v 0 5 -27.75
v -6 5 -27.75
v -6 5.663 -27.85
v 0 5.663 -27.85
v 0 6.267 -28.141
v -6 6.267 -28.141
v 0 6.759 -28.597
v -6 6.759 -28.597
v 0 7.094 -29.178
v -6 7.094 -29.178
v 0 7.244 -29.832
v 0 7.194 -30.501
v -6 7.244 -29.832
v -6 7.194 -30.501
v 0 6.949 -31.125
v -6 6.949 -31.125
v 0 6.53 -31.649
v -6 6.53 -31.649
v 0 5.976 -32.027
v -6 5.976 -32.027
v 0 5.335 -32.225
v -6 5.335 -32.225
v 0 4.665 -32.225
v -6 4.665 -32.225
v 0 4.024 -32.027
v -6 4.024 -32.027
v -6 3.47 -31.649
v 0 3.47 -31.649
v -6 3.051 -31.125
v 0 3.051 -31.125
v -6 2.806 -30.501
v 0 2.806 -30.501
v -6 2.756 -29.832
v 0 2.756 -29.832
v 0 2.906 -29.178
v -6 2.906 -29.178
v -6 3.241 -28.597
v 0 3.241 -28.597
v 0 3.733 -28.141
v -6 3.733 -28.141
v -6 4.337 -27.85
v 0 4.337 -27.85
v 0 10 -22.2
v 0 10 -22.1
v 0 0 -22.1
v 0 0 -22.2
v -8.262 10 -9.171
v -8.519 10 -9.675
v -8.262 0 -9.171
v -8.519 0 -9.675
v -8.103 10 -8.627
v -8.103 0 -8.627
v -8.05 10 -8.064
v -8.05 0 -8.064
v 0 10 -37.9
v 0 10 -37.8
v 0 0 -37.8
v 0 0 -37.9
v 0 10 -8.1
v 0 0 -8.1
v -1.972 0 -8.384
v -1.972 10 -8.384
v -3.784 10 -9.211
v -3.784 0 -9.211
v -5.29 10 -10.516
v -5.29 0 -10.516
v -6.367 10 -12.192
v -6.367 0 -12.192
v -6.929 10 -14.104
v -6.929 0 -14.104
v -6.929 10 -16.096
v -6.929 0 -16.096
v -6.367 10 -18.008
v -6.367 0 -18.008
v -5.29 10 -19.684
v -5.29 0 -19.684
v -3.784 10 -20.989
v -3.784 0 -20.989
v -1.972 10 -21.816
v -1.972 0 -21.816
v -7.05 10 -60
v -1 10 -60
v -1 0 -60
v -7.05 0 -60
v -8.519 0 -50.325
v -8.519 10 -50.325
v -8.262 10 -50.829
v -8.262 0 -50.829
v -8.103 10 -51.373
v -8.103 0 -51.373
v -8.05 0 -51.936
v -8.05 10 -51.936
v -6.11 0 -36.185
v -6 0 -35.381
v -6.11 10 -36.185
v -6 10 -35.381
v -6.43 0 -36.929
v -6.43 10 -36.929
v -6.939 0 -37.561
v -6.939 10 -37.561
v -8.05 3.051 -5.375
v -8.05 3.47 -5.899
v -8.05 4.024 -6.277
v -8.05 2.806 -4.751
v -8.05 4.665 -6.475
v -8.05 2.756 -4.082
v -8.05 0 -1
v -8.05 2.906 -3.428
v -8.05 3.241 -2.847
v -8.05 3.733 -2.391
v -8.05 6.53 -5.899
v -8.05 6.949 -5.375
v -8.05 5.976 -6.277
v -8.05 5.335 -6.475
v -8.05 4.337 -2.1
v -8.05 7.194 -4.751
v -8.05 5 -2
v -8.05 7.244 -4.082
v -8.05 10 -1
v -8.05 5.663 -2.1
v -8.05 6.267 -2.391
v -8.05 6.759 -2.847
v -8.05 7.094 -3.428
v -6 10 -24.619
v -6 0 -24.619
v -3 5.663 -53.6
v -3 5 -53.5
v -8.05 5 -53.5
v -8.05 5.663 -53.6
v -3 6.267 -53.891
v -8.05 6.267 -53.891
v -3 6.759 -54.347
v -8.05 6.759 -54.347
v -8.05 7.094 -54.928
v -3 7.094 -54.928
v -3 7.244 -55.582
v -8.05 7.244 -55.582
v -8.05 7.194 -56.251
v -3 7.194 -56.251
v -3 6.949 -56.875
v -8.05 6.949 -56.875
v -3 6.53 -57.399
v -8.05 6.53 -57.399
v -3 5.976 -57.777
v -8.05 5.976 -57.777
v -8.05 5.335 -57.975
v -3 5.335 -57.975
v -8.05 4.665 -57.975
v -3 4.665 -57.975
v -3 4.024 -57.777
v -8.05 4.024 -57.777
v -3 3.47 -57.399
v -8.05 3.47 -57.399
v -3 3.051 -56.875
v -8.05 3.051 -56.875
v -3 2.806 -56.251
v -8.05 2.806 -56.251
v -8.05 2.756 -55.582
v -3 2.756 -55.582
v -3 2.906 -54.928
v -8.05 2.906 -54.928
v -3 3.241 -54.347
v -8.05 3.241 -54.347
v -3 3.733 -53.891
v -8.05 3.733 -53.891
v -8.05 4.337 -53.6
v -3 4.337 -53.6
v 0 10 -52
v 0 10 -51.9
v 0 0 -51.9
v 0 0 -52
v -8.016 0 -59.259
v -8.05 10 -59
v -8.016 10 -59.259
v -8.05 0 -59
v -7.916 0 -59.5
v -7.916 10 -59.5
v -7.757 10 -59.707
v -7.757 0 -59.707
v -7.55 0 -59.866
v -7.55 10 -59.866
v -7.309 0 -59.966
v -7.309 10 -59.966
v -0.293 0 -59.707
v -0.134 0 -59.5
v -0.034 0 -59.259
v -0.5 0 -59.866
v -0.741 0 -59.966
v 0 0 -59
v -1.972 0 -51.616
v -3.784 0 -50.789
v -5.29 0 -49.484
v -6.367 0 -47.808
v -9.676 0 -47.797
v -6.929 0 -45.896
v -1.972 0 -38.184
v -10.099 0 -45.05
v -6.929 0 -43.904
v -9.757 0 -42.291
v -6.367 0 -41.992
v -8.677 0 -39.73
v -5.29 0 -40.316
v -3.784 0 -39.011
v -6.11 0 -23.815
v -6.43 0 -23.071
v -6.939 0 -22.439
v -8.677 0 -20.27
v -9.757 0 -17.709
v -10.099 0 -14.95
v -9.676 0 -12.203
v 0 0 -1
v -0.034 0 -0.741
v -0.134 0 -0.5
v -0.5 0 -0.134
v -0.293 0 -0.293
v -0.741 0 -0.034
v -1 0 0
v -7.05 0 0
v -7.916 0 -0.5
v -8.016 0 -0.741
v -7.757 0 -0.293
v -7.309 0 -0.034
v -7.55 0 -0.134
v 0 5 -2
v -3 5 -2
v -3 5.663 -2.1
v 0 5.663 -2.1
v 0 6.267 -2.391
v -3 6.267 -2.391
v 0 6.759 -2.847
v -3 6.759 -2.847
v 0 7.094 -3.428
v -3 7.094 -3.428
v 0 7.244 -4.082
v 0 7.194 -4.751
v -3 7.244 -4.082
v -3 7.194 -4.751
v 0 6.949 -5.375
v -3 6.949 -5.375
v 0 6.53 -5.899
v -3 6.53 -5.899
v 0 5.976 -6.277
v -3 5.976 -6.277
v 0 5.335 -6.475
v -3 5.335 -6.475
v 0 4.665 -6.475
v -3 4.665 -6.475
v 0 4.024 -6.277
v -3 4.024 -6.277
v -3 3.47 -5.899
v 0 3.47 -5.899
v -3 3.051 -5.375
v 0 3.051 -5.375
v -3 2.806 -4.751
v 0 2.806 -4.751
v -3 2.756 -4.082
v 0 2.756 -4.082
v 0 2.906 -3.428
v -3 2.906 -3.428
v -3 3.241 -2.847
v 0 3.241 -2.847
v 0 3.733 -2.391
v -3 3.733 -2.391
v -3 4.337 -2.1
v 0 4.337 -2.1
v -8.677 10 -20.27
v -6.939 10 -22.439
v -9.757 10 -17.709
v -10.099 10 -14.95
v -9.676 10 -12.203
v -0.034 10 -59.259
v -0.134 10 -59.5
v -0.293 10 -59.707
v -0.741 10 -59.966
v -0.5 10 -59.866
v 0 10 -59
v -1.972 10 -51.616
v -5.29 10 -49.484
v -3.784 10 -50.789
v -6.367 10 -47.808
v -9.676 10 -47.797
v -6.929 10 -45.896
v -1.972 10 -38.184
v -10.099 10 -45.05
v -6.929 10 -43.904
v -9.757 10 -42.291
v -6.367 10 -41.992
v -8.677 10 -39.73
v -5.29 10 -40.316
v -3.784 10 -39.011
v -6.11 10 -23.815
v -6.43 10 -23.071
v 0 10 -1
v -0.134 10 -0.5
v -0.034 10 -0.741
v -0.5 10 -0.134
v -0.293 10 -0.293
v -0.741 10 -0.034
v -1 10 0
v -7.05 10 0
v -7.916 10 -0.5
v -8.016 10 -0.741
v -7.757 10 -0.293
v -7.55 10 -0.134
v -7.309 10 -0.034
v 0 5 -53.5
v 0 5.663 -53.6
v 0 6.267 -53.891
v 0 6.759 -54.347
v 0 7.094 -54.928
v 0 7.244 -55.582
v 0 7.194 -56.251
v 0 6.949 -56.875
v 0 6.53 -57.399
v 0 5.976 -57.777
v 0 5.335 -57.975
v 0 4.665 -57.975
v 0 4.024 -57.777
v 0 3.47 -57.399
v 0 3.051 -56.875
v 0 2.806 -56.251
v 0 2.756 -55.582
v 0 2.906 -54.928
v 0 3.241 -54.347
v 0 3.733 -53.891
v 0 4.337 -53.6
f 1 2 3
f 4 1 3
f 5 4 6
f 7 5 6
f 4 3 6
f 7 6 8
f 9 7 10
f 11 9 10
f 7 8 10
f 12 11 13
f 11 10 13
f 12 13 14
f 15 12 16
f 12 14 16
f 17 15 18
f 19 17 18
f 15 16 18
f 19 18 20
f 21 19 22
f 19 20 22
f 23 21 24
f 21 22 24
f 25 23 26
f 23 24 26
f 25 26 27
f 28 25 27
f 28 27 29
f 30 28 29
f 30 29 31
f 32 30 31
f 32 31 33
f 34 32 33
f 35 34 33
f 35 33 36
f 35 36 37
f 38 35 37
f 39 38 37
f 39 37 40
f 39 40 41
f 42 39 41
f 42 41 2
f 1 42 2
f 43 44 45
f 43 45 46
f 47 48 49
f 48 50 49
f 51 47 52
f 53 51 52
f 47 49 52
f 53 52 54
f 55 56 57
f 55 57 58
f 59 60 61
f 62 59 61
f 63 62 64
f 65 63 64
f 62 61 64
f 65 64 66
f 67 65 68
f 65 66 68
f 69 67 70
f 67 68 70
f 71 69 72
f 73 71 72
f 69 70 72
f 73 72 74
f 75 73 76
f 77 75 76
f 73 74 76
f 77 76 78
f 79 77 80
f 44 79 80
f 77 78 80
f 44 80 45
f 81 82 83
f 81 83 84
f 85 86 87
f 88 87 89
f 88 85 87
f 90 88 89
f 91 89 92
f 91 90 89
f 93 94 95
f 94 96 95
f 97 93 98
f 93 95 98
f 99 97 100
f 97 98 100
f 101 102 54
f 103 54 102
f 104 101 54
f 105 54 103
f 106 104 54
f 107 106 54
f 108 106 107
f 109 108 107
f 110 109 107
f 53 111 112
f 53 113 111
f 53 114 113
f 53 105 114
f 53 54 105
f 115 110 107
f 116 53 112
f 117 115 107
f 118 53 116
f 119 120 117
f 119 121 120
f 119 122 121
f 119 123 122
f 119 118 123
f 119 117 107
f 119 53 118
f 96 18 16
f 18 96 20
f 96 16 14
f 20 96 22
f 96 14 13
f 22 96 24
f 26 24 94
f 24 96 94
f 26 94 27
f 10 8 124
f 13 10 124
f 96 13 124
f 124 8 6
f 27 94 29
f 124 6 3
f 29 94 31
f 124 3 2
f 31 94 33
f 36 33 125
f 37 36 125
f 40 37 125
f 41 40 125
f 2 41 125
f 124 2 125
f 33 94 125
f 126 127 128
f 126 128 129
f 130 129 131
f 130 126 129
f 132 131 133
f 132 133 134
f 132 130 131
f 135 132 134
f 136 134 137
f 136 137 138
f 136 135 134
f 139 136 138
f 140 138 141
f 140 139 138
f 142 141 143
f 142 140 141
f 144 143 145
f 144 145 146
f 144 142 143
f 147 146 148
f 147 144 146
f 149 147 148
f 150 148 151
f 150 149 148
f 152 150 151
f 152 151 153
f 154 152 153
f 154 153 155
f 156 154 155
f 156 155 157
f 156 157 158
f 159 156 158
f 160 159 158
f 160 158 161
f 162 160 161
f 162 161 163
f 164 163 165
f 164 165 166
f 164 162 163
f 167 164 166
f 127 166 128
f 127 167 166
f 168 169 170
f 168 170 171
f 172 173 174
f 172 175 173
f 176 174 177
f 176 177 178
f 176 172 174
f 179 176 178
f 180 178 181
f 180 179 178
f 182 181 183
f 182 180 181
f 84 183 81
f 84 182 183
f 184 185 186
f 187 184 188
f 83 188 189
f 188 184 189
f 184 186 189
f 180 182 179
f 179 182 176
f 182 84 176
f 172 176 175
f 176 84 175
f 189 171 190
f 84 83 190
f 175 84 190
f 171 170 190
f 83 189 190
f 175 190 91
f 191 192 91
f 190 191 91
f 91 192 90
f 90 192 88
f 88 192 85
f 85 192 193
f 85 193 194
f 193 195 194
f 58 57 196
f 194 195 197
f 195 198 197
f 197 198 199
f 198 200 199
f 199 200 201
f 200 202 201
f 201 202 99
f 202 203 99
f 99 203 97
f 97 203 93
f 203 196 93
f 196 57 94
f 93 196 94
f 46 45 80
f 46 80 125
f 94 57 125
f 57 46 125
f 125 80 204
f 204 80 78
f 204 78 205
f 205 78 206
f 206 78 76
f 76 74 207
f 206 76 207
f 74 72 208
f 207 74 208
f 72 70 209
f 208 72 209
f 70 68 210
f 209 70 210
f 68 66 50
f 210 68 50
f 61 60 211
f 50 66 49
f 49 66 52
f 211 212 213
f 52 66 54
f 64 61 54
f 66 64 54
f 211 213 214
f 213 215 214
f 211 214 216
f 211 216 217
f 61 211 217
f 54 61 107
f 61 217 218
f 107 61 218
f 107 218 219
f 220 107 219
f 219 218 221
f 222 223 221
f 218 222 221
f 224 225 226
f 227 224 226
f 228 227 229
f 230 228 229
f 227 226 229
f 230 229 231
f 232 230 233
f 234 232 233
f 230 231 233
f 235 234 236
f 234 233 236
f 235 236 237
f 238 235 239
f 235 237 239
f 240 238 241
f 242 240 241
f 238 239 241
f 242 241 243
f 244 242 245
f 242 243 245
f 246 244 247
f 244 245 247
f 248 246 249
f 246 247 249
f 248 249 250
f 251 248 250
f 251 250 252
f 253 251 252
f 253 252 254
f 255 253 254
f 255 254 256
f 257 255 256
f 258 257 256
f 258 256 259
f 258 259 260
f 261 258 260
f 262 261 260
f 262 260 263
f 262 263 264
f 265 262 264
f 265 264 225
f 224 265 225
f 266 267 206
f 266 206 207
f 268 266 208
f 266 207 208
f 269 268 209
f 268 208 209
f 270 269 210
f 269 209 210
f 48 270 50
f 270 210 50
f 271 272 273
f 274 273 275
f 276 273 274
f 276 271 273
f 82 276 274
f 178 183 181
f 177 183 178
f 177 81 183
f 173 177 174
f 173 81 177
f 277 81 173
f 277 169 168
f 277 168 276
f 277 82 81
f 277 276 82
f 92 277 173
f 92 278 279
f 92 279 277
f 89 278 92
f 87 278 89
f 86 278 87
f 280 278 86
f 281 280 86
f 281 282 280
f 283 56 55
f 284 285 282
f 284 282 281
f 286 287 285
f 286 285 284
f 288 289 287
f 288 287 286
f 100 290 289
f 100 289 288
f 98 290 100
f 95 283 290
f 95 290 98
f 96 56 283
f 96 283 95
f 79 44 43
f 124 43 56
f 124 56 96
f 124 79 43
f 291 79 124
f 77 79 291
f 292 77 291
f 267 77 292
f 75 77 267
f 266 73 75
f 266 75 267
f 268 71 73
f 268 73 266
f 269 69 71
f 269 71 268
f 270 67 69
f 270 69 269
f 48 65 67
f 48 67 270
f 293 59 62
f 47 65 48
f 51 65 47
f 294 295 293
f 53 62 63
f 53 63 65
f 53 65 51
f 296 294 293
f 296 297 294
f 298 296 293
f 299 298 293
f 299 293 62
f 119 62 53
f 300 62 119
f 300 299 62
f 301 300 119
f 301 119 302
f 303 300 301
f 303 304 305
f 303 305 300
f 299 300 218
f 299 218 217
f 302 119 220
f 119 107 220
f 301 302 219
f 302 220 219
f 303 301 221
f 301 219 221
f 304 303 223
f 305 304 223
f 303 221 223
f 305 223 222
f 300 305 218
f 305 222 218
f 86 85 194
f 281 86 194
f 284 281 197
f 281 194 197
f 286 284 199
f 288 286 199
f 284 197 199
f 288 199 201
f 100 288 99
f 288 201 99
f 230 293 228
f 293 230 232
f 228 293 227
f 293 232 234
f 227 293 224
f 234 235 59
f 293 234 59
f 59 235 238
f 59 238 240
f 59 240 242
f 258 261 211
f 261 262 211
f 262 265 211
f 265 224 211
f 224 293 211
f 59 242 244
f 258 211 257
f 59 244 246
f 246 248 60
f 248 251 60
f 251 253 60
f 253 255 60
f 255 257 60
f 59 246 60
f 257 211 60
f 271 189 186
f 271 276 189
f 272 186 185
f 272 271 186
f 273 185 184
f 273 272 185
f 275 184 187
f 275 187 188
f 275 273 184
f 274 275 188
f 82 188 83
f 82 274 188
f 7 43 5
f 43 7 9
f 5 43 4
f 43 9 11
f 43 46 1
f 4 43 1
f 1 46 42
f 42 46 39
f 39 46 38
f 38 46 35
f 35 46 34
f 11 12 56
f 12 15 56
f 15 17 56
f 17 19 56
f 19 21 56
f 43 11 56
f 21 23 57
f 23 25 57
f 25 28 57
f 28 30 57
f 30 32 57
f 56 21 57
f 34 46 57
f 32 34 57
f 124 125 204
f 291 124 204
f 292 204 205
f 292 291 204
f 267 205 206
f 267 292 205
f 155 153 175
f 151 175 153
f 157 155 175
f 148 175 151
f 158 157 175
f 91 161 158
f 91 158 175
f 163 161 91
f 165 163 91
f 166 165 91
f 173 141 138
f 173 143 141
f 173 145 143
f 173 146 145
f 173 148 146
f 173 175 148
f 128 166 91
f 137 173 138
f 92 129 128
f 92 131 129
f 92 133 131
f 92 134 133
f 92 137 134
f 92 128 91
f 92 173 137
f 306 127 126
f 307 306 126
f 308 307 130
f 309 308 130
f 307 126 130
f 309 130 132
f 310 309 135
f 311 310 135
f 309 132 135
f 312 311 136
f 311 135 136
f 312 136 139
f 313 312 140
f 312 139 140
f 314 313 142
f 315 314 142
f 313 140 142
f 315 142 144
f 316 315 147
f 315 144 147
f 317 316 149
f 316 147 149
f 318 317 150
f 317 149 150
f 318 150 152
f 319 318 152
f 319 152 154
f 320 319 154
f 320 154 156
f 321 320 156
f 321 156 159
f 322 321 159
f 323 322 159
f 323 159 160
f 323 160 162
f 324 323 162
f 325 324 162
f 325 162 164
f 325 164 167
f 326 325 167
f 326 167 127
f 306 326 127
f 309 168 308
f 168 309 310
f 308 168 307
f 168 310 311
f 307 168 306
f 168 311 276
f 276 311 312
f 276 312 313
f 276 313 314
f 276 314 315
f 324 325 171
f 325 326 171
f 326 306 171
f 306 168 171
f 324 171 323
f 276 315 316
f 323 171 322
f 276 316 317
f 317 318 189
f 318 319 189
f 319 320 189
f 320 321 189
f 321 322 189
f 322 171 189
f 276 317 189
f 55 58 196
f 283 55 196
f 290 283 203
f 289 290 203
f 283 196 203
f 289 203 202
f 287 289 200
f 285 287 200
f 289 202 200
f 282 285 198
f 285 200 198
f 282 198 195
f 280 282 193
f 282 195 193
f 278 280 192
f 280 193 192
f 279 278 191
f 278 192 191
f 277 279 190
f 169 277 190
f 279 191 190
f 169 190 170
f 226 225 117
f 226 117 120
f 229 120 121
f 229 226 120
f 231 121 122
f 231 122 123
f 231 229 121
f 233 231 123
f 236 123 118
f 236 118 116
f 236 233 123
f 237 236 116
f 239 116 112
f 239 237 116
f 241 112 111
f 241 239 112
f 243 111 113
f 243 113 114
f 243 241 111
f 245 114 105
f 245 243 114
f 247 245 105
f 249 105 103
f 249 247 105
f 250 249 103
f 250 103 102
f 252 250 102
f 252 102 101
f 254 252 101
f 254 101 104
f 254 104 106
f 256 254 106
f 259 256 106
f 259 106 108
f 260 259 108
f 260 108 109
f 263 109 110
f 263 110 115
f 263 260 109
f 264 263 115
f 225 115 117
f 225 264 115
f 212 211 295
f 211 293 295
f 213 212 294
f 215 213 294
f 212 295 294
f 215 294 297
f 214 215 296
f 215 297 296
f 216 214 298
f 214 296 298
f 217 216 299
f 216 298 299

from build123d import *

# Parameters (mm, degrees)
EXTRUDE_1_DEPTH          = 10
EXTRUDE_2_DEPTH          = 10
SKETCH_3_R               = 2.25
CUT_EXTRUDE_1_DEPTH      = 5.049845
CUT_EXTRUDE_1_DEPTH_BACK = 4
EXTRUDE_4_DEPTH          = 10
SKETCH_4_R               = 2.25
CUT_EXTRUDE_2_DEPTH      = 7
FILLET_1_R               = 3
FILLET_2_R               = 1
EXTRUDE_3_DEPTH          = 10
FILLET_3_R               = 1


with BuildPart() as part:
    # Эскиз1 → Бобышка-Вытянуть1 (new body)
    with BuildSketch(Plane(origin=(0, 0, 0), x_dir=(1, 0, 0), z_dir=(0, 1, 0))):
        with BuildLine():
            Line((0, 0), (0, 8))
            ThreePointArc((0, 8), (-7.1, 15.1), (0, 22.2))
            Line((0, 22.2), (0, 37.8))
            ThreePointArc((0, 37.8), (-7.1, 44.9), (0, 52))
            Line((0, 52), (0, 60))
            Line((0, 60), (-3, 60))
            Line((-3, 60), (-3, 54.544169223))
            ThreePointArc((-3, 54.544169223), (-10.1, 44.9), (-3, 35.255830777))
            Line((-3, 35.255830777), (-3, 24.744169223))
            ThreePointArc((-3, 24.744169223), (-10.1, 15.1), (-3, 5.455830777))
            Line((-3, 5.455830777), (-3, 0))
            Line((-3, 0), (0, 0))
        make_face()
    extrude(amount=EXTRUDE_1_DEPTH)

    # Эскиз2 → Бобышка-Вытянуть2 (add)
    with BuildSketch(Plane(origin=(0, 10, 0), x_dir=(1, 0, 0), z_dir=(0, 1, 0))):
        with BuildLine():
            Line((-3, 60), (-8.049844719, 60))
            Line((-8.049844719, 60), (-8.049844719, 51))
            ThreePointArc((-8.049844719, 51), (-5.802159163, 53.167100402), (-3, 54.544169223))
            Line((-3, 54.544169223), (-3, 60))
        make_face()
        with BuildLine():
            Line((-3, 0), (-3, 5.455830777))
            ThreePointArc((-3, 5.455830777), (-5.802159163, 6.832899598), (-8.049844719, 9))
            Line((-8.049844719, 9), (-8.049844719, 0))
            Line((-8.049844719, 0), (-3, 0))
        make_face()
    extrude(amount=-EXTRUDE_2_DEPTH)

    # Эскиз3 → Вырез-Вытянуть1 (cut, two sides)
    with BuildSketch(Plane.ZY.offset(3)) as cut_extrude_1_sk:
        with Locations((-55.75, 5)):
            Circle(SKETCH_3_R)
        with Locations((-4.25, 5)):
            Circle(SKETCH_3_R)
    extrude(amount=CUT_EXTRUDE_1_DEPTH, mode=Mode.SUBTRACT)
    extrude(cut_extrude_1_sk.sketch, amount=-CUT_EXTRUDE_1_DEPTH_BACK, mode=Mode.SUBTRACT)

    # Эскиз7 → Бобышка-Вытянуть4 (add, through all)
    with BuildSketch(Plane(origin=(-3, 0, 0), x_dir=(0, 0, 1), z_dir=(0, 1, 0))):
        with BuildLine():
            Line((-36.775346161, -3), (-23.224653839, -3))
            ThreePointArc((-23.224653839, -3), (-24.11014807, -1.563686202), (-24.744169223, 0))
            Line((-24.744169223, 0), (-35.255830777, 0))
            ThreePointArc((-35.255830777, 0), (-35.88985193, -1.563686202), (-36.775346161, -3))
        make_face()
    extrude(amount=EXTRUDE_4_DEPTH)

    # Эскиз4 → Вырез-Вытянуть2 (cut, through all)
    with BuildSketch(Plane.ZY.offset(6)):
        with Locations((-30, 5)):
            Circle(SKETCH_4_R)
    extrude(amount=-CUT_EXTRUDE_2_DEPTH, mode=Mode.SUBTRACT)

    # Скругление1
    fillet_1_edges = [part.edges().sort_by_distance(p)[0] for p in [
        (-8.049844719, 5, -51),
        (-8.049844719, 5, -9),
        (-6, 5, -36.775346161),
        (-6, 5, -23.224653839),
    ]]
    fillet(fillet_1_edges, radius=FILLET_1_R)

    # Скругление2
    fillet_2_edges = [part.edges().sort_by_distance(p)[0] for p in [
        (-8.049844719, 5, -60),
        (-8.049844719, 5, 0),
    ]]
    fillet(fillet_2_edges, radius=FILLET_2_R)

    # Эскиз5 → Бобышка-Вытянуть3 (add, through all)
    with BuildSketch(Plane.XZ):
        with BuildLine():
            Line((0, -8), (0, -8.1))
            ThreePointArc((0, -8.1), (-7, -15.1), (0, -22.1))
            Line((0, -22.1), (0, -22.2))
            ThreePointArc((0, -22.2), (-7.1, -15.1), (0, -8))
        make_face()
        with BuildLine():
            Line((0, -51.9), (0, -52))
            ThreePointArc((0, -52), (-7.1, -44.9), (0, -37.8))
            Line((0, -37.8), (0, -37.9))
            ThreePointArc((0, -37.9), (-7, -44.9), (0, -51.9))
        make_face()
    extrude(amount=-EXTRUDE_3_DEPTH)

    # Скругление3
    fillet_3_edges = [part.edges().sort_by_distance(p)[0] for p in [
        (0, 5, -60),
        (0, 5, 0),
    ]]
    fillet(fillet_3_edges, radius=FILLET_3_R)


solid = part.part
